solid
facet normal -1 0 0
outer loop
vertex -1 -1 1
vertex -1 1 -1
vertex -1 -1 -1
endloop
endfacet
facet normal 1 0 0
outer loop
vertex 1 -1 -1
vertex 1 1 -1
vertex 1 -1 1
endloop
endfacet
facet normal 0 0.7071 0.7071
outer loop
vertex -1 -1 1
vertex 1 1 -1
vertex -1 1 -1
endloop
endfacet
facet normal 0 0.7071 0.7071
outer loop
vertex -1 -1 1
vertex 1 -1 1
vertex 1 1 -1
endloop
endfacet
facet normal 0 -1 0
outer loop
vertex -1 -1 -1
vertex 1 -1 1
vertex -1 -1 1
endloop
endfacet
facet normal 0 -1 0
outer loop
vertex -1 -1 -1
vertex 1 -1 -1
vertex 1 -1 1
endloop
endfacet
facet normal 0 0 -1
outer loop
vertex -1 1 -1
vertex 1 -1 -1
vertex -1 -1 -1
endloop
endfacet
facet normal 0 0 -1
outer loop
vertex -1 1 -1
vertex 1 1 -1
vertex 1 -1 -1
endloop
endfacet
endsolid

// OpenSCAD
// A ramp

module ramp(){
    rotate([0,90,0])
        linear_extrude(height = 2, center=true) 
            polygon([
                    [1, 1],
                    [1, -1],
                    [-1, -1],
            ]);
}

ramp();
